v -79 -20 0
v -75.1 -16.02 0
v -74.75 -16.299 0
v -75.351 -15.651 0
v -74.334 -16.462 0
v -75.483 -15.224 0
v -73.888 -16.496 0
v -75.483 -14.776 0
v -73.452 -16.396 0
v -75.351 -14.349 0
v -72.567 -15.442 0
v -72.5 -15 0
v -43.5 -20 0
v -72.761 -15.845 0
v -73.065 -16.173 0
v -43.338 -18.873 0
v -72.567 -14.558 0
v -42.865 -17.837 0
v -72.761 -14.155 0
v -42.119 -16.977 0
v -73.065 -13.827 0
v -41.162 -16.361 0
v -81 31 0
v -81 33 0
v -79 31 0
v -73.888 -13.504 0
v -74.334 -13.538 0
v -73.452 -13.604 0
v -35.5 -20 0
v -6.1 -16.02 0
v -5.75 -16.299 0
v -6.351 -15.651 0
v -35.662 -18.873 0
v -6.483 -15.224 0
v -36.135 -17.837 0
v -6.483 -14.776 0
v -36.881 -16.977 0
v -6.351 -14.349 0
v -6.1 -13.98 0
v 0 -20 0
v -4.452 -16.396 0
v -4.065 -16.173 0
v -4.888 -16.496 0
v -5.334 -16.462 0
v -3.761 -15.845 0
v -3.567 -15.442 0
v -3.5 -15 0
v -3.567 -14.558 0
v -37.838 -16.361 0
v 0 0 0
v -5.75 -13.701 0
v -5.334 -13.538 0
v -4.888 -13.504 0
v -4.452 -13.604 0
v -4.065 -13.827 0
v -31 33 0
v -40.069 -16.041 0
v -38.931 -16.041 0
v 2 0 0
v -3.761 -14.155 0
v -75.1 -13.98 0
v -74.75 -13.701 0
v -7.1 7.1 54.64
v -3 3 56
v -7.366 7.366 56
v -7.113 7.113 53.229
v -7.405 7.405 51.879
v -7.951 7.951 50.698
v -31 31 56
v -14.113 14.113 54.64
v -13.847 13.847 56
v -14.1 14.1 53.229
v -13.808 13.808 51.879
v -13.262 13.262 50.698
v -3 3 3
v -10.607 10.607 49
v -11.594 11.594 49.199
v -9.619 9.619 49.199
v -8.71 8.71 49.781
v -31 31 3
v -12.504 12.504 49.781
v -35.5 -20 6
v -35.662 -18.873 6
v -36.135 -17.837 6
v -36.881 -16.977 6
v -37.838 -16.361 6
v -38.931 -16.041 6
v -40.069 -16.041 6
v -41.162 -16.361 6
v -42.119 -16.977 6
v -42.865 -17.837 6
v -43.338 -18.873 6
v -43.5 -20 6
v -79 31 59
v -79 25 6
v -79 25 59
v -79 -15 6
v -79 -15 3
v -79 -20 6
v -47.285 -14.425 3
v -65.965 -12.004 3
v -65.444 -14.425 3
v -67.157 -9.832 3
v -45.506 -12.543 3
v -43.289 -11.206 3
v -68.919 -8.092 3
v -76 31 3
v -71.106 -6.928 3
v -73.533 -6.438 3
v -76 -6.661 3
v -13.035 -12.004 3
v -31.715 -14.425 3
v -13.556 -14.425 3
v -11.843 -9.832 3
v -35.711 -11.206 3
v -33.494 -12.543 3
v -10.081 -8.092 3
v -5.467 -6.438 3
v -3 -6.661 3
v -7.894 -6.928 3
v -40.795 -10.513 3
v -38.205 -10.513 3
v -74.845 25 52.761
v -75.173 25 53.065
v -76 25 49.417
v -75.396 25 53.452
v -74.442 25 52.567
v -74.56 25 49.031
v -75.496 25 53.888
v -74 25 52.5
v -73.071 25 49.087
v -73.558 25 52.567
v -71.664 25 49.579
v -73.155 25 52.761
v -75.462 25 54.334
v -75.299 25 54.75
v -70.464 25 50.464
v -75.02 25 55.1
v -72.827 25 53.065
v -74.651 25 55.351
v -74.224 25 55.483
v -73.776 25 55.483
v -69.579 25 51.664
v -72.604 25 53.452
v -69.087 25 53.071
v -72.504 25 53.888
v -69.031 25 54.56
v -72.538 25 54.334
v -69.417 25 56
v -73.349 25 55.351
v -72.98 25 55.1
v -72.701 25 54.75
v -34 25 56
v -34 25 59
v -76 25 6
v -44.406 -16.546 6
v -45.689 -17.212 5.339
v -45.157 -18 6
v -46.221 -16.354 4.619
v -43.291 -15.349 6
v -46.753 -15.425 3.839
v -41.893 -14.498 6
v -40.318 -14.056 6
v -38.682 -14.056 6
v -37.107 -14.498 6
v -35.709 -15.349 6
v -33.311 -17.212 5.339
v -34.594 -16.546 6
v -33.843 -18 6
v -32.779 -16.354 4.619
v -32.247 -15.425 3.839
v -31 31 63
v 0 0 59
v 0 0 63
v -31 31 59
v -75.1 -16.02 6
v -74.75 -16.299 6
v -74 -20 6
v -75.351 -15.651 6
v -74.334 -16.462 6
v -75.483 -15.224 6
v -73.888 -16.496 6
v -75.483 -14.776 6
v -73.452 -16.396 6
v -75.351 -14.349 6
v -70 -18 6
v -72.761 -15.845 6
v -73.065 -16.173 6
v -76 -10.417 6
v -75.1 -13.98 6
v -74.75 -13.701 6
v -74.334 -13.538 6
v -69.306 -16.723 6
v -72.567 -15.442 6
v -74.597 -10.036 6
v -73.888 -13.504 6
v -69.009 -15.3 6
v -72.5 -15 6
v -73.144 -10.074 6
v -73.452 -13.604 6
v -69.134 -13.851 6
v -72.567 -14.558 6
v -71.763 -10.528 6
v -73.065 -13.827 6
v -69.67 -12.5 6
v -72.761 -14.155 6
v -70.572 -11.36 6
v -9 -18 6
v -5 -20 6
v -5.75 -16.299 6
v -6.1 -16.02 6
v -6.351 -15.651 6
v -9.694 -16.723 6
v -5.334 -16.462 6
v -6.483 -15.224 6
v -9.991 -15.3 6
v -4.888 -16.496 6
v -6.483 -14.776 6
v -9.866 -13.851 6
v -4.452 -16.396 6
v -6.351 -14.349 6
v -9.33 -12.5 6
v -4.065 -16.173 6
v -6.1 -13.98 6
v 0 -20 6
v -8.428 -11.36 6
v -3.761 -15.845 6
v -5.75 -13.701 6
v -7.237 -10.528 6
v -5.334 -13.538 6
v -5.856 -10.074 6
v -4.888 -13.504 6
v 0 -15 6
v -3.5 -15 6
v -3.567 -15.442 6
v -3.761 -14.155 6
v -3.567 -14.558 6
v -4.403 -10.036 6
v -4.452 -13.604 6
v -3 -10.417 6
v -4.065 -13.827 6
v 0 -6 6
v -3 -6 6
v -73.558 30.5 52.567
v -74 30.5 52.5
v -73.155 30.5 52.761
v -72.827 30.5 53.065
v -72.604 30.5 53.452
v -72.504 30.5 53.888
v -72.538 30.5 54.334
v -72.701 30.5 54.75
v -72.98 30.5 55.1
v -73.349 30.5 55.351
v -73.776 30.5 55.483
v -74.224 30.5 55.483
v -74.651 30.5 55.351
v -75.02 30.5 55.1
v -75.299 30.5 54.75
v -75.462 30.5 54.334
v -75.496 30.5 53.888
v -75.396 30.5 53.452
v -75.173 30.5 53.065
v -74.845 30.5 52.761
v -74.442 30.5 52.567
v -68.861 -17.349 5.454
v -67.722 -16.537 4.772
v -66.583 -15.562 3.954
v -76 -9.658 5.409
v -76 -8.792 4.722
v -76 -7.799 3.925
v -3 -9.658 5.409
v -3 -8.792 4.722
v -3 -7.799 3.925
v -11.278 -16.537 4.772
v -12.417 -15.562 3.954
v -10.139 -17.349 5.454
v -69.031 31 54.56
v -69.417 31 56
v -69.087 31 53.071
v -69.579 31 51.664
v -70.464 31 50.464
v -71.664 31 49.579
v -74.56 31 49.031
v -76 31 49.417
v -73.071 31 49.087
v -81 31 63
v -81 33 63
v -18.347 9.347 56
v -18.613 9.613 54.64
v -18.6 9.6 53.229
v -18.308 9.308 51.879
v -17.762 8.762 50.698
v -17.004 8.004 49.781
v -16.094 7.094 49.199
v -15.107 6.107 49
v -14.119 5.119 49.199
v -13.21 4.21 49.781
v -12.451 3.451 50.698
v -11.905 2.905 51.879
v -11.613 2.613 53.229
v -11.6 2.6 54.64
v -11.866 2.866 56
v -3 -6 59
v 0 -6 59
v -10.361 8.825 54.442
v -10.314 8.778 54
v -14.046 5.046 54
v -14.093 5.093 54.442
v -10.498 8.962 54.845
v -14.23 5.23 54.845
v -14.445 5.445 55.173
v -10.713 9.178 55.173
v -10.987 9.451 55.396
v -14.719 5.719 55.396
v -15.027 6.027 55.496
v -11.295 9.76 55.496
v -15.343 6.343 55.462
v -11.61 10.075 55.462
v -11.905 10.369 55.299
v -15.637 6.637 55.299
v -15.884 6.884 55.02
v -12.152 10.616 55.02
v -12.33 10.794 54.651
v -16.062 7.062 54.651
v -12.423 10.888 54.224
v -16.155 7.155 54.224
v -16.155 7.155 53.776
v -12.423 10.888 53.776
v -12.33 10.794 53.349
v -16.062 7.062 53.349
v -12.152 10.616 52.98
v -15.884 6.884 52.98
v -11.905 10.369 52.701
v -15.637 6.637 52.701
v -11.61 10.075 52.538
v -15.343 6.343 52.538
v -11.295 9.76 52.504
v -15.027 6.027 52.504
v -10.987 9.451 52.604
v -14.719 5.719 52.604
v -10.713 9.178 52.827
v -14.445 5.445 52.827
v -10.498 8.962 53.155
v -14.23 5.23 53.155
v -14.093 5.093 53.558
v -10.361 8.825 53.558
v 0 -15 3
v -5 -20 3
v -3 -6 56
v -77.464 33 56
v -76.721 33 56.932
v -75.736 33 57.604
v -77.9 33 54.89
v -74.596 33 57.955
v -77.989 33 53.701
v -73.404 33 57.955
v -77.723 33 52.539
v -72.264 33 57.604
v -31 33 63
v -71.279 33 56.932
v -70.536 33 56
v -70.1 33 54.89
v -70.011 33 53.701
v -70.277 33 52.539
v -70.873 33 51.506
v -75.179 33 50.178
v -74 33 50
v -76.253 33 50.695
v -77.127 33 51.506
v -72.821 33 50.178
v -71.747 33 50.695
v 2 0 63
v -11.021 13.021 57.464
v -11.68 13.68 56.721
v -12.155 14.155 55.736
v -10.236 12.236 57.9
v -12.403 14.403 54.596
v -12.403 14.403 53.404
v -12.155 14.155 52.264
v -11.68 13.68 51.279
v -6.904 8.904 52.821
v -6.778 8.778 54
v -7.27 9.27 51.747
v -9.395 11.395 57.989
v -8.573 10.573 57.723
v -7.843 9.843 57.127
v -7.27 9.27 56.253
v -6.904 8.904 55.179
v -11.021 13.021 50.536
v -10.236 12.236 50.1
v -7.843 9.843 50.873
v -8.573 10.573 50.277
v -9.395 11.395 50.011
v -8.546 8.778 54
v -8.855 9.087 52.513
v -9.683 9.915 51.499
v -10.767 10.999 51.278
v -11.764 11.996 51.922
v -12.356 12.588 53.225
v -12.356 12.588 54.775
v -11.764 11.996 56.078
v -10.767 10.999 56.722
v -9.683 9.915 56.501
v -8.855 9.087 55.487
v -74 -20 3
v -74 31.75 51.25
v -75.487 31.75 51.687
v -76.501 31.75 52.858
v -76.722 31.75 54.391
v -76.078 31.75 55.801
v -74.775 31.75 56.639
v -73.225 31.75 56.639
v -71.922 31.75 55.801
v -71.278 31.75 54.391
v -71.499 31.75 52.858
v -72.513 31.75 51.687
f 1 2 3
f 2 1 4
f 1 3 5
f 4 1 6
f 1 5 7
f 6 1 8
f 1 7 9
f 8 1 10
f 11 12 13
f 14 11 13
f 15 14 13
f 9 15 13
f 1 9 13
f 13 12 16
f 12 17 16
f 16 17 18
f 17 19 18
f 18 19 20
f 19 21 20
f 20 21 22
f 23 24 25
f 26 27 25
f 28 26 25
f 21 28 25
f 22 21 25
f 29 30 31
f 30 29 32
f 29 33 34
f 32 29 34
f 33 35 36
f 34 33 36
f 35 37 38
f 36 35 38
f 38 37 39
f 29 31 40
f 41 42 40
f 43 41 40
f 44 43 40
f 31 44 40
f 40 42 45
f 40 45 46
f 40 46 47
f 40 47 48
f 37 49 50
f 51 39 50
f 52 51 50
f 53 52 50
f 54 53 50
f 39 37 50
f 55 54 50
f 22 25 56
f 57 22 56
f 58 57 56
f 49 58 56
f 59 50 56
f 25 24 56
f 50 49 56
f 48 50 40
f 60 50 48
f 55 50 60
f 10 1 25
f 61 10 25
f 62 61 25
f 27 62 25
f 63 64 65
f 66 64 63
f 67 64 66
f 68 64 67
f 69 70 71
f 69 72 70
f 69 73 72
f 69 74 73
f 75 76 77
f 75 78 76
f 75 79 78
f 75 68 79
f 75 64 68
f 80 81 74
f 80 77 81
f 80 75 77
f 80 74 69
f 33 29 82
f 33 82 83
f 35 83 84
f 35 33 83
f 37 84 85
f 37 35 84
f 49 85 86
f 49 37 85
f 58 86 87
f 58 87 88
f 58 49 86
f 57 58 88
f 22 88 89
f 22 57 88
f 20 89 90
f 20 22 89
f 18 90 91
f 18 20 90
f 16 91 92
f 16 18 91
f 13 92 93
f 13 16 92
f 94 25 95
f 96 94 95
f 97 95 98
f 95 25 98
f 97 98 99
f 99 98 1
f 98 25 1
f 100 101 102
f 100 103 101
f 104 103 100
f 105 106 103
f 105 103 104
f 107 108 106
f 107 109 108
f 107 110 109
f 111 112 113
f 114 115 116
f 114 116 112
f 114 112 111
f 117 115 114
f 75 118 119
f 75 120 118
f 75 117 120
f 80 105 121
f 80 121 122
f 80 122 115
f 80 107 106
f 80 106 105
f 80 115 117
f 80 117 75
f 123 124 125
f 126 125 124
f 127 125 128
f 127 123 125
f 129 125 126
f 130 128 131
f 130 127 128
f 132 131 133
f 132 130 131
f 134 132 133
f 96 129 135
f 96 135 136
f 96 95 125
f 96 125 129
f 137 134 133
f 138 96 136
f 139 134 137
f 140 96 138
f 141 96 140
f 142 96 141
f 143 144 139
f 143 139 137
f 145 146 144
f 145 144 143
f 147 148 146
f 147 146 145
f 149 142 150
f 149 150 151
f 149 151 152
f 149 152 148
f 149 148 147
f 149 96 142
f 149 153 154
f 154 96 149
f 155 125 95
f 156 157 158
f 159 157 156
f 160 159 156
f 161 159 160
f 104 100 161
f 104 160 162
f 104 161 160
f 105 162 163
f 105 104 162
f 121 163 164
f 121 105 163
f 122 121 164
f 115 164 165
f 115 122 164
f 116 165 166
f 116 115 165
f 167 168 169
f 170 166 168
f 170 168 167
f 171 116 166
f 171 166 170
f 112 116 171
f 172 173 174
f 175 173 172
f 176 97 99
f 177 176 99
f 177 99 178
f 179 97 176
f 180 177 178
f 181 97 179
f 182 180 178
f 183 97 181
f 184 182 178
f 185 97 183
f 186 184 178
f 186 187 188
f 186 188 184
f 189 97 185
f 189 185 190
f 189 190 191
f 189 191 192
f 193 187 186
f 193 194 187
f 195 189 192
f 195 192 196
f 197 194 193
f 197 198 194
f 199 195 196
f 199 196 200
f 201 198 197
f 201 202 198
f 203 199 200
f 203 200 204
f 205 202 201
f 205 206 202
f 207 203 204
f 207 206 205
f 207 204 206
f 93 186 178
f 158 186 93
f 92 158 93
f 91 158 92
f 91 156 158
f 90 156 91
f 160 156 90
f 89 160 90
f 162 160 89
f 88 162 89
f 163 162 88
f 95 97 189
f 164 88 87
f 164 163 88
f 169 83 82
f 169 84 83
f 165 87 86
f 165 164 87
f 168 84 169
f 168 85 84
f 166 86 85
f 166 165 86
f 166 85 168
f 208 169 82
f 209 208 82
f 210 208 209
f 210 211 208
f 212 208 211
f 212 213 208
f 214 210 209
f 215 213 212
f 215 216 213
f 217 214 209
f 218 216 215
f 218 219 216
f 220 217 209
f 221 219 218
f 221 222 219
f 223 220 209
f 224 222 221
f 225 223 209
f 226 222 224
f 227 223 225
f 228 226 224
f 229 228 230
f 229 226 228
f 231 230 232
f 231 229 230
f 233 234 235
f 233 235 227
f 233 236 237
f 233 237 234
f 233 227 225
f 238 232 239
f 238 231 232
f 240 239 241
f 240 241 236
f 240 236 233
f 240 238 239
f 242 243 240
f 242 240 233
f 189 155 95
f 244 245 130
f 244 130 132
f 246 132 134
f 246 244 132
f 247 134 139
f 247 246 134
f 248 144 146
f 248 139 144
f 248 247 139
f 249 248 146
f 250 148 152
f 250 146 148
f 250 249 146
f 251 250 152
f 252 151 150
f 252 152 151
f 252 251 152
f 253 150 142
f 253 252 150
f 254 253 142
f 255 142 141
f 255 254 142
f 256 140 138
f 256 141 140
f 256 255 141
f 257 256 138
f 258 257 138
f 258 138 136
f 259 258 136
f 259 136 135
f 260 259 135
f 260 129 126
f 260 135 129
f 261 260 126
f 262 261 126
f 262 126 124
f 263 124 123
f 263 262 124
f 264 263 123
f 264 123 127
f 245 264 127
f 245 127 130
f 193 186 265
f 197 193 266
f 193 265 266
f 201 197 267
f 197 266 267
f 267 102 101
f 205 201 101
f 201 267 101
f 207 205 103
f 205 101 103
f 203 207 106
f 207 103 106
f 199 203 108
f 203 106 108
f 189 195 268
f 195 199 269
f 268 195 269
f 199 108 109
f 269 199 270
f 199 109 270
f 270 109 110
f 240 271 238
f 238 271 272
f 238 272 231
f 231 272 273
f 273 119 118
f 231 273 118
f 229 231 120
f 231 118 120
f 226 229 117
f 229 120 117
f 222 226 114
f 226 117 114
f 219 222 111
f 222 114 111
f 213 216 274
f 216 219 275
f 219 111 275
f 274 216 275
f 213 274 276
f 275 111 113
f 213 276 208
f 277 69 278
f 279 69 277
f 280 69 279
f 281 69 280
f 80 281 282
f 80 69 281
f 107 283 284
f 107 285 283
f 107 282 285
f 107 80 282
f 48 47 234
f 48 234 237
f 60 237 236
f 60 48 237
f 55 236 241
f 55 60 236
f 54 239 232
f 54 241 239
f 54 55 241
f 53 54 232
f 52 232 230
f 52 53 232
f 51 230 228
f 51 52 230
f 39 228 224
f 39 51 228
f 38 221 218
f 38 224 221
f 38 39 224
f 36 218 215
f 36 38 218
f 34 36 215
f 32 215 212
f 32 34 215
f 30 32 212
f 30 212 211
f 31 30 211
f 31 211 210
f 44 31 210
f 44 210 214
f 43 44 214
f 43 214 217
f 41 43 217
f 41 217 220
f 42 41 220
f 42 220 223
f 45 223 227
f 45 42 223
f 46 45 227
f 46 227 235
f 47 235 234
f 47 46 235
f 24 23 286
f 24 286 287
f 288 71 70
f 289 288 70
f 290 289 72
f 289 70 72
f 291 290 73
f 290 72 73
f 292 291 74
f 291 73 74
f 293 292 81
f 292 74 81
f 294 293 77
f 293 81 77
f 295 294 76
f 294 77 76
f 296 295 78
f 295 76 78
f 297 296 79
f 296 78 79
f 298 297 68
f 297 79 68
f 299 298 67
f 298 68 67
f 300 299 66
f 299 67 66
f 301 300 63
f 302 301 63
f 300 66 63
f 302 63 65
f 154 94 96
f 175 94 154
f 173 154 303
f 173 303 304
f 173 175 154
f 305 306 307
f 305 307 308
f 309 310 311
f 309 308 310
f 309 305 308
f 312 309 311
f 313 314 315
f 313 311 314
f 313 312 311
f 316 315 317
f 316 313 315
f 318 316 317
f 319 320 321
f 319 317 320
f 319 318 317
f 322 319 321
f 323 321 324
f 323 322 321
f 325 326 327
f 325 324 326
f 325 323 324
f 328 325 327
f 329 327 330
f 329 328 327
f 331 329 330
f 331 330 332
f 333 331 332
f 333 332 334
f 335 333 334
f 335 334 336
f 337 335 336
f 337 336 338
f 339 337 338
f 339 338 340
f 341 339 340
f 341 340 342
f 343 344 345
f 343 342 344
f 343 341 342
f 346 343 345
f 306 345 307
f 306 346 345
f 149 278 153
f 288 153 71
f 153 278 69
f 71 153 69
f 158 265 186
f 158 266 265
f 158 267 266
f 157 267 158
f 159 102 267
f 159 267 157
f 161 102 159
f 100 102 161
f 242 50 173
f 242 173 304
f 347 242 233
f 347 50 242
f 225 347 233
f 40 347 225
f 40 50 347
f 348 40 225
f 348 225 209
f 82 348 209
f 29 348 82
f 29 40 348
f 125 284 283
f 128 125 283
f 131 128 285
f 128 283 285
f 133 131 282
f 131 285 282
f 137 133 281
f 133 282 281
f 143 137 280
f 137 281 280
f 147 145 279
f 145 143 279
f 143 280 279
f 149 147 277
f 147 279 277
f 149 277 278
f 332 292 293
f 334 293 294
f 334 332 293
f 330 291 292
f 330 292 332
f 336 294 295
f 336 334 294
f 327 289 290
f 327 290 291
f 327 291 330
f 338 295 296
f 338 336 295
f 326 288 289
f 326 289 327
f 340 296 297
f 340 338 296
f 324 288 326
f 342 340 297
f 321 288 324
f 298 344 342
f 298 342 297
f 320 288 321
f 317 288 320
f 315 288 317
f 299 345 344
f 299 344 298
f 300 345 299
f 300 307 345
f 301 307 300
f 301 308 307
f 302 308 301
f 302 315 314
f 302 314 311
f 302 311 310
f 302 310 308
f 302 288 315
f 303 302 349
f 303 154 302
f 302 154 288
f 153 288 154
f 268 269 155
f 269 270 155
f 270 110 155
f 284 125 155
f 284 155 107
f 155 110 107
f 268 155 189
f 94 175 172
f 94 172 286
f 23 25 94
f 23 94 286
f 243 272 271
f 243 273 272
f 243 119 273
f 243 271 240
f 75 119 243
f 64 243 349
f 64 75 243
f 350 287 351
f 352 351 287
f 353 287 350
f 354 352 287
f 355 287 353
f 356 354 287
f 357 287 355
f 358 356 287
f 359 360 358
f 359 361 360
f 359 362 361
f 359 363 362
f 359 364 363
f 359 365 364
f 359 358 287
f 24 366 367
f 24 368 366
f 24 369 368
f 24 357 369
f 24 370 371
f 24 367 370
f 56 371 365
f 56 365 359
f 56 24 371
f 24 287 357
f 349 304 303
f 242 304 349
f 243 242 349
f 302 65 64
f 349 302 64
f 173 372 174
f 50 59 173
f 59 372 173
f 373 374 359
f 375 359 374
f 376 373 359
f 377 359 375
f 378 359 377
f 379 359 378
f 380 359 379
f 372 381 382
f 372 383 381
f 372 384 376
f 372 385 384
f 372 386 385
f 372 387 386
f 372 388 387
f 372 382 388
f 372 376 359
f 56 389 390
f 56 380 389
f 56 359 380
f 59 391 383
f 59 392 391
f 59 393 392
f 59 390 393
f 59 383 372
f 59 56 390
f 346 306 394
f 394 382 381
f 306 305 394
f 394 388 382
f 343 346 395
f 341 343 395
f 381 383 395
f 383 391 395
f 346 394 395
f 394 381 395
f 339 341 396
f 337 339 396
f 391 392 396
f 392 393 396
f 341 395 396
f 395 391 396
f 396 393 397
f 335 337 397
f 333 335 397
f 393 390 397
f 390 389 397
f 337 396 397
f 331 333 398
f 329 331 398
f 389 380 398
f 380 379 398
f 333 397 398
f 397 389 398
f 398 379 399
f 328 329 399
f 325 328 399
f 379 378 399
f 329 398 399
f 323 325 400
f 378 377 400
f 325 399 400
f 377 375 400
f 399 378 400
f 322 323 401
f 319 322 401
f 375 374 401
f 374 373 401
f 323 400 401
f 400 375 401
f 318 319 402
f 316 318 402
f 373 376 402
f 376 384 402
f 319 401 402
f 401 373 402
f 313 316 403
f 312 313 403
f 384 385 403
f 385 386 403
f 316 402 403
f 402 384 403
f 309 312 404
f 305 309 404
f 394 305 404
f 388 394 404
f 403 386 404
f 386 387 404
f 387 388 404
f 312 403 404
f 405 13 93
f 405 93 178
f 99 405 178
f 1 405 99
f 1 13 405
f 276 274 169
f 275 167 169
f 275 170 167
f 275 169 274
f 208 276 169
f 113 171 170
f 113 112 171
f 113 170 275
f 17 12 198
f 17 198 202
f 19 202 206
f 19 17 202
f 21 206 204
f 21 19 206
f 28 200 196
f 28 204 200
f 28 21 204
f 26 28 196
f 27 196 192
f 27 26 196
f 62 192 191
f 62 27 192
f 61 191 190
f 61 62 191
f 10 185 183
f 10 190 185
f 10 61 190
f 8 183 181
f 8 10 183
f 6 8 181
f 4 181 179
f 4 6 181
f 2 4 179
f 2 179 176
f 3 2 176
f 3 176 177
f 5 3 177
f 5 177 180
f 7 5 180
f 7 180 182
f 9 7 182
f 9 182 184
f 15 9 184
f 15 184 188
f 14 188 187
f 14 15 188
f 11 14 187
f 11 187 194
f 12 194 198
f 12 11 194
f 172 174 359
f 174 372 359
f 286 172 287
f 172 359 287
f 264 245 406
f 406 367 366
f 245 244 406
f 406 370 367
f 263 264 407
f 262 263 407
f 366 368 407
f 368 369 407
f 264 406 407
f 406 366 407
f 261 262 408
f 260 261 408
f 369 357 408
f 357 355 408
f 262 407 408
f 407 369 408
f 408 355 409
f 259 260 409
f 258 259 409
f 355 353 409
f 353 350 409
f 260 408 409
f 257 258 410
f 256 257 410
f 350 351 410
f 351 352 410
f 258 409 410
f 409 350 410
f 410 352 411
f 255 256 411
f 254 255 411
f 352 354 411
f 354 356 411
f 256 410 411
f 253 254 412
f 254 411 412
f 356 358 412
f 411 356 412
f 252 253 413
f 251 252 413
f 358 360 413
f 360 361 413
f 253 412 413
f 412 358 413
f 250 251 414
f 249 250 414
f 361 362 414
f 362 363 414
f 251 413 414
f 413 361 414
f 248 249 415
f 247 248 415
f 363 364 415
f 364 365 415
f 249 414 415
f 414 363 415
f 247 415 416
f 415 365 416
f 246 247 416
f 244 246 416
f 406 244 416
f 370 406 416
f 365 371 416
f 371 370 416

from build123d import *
from OCP.BRepFilletAPI import BRepFilletAPI_MakeChamfer
from build123d.topology import SkipClean

# Parameters (mm, degrees)
EXTRUDE_1_DEPTH          = 63
EXTRUDE_2_DEPTH          = 3
SKETCH_3_W               = 3
SKETCH_3_H               = 6
EXTRUDE_3_DEPTH          = 56
EXTRUDE_4_DEPTH          = 3
SKETCH_6_W               = 3
SKETCH_6_H               = 6
EXTRUDE_5_DEPTH          = 45
SKETCH_7_W               = 3
SKETCH_7_H               = 6
EXTRUDE_6_DEPTH          = 14
SKETCH_8_R               = 4
CUT_EXTRUDE_1_DEPTH      = 3
EXTRUDE_7_DEPTH          = 3
SKETCH_10_R              = 5
EXTRUDE_8_DEPTH          = 3
SKETCH_12_R              = 5
EXTRUDE_9_DEPTH          = 6
CUT_EXTRUDE_3_DEPTH      = 113.049096382
CUT_EXTRUDE_3_DEPTH_BACK = 113.049096382
SKETCH_13_R              = 1.5
CHAMFER_2_SIZE           = 2.5
SKETCH_14_R              = 5
EXTRUDE_10_DEPTH         = 6.363961031
CUT_EXTRUDE_4_DEPTH      = 106.959898075
CUT_EXTRUDE_4_DEPTH_BACK = 106.959898075
SKETCH_15_R              = 1.5
CHAMFER_3_SIZE           = 2.5
CUT_EXTRUDE_5_DEPTH      = 105.398275848
CUT_EXTRUDE_5_DEPTH_BACK = 105.398275848
SKETCH_11_R              = 1.5
CHAMFER_4_SIZE           = 3
CHAMFER_4_SIZE_2         = 3.575260778


with BuildPart() as part:
    # Эскиз1 → Бобышка-Вытянуть1 (new body)
    with BuildSketch(Plane.XY):
        Polygon((0, 0), (-31, 31), (-81, 31), (-81, 33), (-31, 33), (2, 0), align=None)
    extrude(amount=EXTRUDE_1_DEPTH)

    # Эскиз2 → Бобышка-Вытянуть2 (add)
    with BuildSketch(Plane(origin=(0, 0, 0), x_dir=(-1, 0, 0), z_dir=(0, 0, -1))):
        Polygon((0, 0), (31, 31), (79, 31), (79, -20), (0, -20), align=None)
    extrude(amount=-EXTRUDE_2_DEPTH)

    # Эскиз3 → Бобышка-Вытянуть3 (add)
    with BuildSketch(Plane.XY.offset(3)):
        Polygon((0, 0), (0, -6), (-3, -6), (-3, 3), align=None)
        with Locations((-77.5, 28)):
            Rectangle(SKETCH_3_W, SKETCH_3_H)
    extrude(amount=EXTRUDE_3_DEPTH)

    # Эскиз5 → Бобышка-Вытянуть4 (add)
    with BuildSketch(Plane.XY.offset(59)):
        Polygon((-79, 25), (-76, 25), (-34, 25), (-3, -6), (0, -6), (0, 0), (-31, 31), (-79, 31), align=None)
    extrude(amount=-EXTRUDE_4_DEPTH)

    # Эскиз6 → Бобышка-Вытянуть5 (add)
    with BuildSketch(Plane.XZ.offset(-25)):
        with Locations((-77.5, 3)):
            Rectangle(SKETCH_6_W, SKETCH_6_H)
    extrude(amount=EXTRUDE_5_DEPTH)

    # Эскиз7 → Бобышка-Вытянуть6 (add)
    with BuildSketch(Plane.XZ.offset(6)):
        with Locations((-1.5, 3)):
            Rectangle(SKETCH_7_W, SKETCH_7_H)
    extrude(amount=EXTRUDE_6_DEPTH)

    # Эскиз8 → Вырез-Вытянуть1 (cut)
    with BuildSketch(Plane(origin=(0, 0, 0), x_dir=(-1, 0, 0), z_dir=(0, 0, -1))):
        with Locations((39.5, -20)):
            Circle(SKETCH_8_R)
    extrude(amount=-CUT_EXTRUDE_1_DEPTH, mode=Mode.SUBTRACT)

    # Эскиз9 → Бобышка-Вытянуть7 (add)
    with SkipClean():  # the faces are left unmerged after this step: merging them gives an invalid solid
        with BuildSketch(Plane.XY.offset(3)):
            with BuildLine():
                Line((-3, -20), (-35.5, -20))
                ThreePointArc((-35.5, -20), (-39.5, -16), (-43.5, -20))
                Line((-43.5, -20), (-76, -20))
                Line((-76, -20), (-76, -18))
                Line((-76, -18), (-45.156854249, -18))
                ThreePointArc((-45.156854249, -18), (-39.5, -14), (-33.843145751, -18))
                Line((-33.843145751, -18), (-3, -18))
                Line((-3, -18), (-3, -20))
            make_face()
        extrude(amount=EXTRUDE_7_DEPTH)
    add(part.part.scale(1), mode=Mode.REPLACE)  # the faces are merged on a copy

    # Эскиз10 → Бобышка-Вытянуть8 (add)
    with BuildSketch(Plane.XY.offset(3)):
        with Locations((-74, -15)):
            Circle(SKETCH_10_R)
        with Locations((-5, -15)):
            Circle(SKETCH_10_R)
    extrude(amount=EXTRUDE_8_DEPTH)

    # Эскиз12 → Бобышка-Вытянуть9 (add)
    with BuildSketch(Plane.XZ.offset(-31)):
        with Locations((-74, 54)):
            Circle(SKETCH_12_R)
    extrude(amount=EXTRUDE_9_DEPTH)

    # Эскиз13 → Вырез-Вытянуть3 (cut, two sides: drawn at the far end of the back side and taken through both)
    with BuildSketch(Plane.XZ.offset(-25).offset(-CUT_EXTRUDE_3_DEPTH_BACK)):
        with Locations(Location((-74, 54, 0), (0, 0, 270))):
            Circle(SKETCH_13_R)
    extrude(amount=CUT_EXTRUDE_3_DEPTH + CUT_EXTRUDE_3_DEPTH_BACK, mode=Mode.SUBTRACT)

    # Фаска2
    chamfer_2_edges = [part.edges().sort_by_distance(p)[0] for p in [
        (-74, 33, 55.5),
    ]]
    chamfer(chamfer_2_edges, length=CHAMFER_2_SIZE)

    # Эскиз14 → Бобышка-Вытянуть10 (add)
    with BuildSketch(Plane(origin=(0, 0, 0), x_dir=(0, 0, 1), z_dir=(-0.7071067811865462, -0.7071067811865489, 0))):
        with Locations((54, 15)):
            Circle(SKETCH_14_R)
    extrude(amount=EXTRUDE_10_DEPTH)

    # Эскиз15 → Вырез-Вытянуть4 (cut, two sides: drawn at the far end of the back side and taken through both)
    with BuildSketch(Plane(origin=(-4.5, -4.5, 0), x_dir=(0, 0, 1), z_dir=(-0.7071067811865464, -0.7071067811865488, 0)).offset(-CUT_EXTRUDE_4_DEPTH_BACK)):
        with Locations(Location((54, 15, 0), (0, 0, 270))):
            Circle(SKETCH_15_R)
    extrude(amount=CUT_EXTRUDE_4_DEPTH + CUT_EXTRUDE_4_DEPTH_BACK, mode=Mode.SUBTRACT)

    # Фаска3
    chamfer_3_edges = [part.edges().sort_by_distance(p)[0] for p in [
        (-10.66726189, 12.66726189, 54),
    ]]
    chamfer(chamfer_3_edges, length=CHAMFER_3_SIZE)

    # Эскиз11 → Вырез-Вытянуть5 (cut, two sides: drawn at the far end of the back side and taken through both)
    with BuildSketch(Plane.XY.offset(6).offset(-CUT_EXTRUDE_5_DEPTH_BACK)):
        with Locations((-74, -15)):
            Circle(SKETCH_11_R)
        with Locations((-5, -15)):
            Circle(SKETCH_11_R)
    extrude(amount=CUT_EXTRUDE_5_DEPTH + CUT_EXTRUDE_5_DEPTH_BACK, mode=Mode.SUBTRACT)

    # Фаска4
    chamfer_4_edges_1 = [part.edges().sort_by_distance(p)[0] for p in [
        (-8.920951867, -11.897398437, 3),
    ]]
    chamfer_4_side_1 = [part.faces().sort_by_distance(p)[0] for p in [
        (-8.920951867, -11.897398437, 3.06),
    ]]
    chamfer_4_edges_2 = [part.edges().sort_by_distance(p)[0] for p in [
        (-70.079048133, -11.897398437, 3),
    ]]
    chamfer_4_side_2 = [part.faces().sort_by_distance(p)[0] for p in [
        (-70.079048133, -11.897398437, 3.06),
    ]]
    chamfer_4_edges_3 = [part.edges().sort_by_distance(p)[0] for p in [
        (-21.421572875, -18, 3),
    ]]
    chamfer_4_side_3 = [part.faces().sort_by_distance(p)[0] for p in [
        (-21.421572875, -18, 3.06),
    ]]
    chamfer_4_edges_4 = [part.edges().sort_by_distance(p)[0] for p in [
        (-39.5, -14, 3),
    ]]
    chamfer_4_side_4 = [part.faces().sort_by_distance(p)[0] for p in [
        (-39.5, -14, 3.06),
    ]]
    chamfer_4_edges_5 = [part.edges().sort_by_distance(p)[0] for p in [
        (-57.578427125, -18, 3),
    ]]
    chamfer_4_side_5 = [part.faces().sort_by_distance(p)[0] for p in [
        (-57.578427125, -18, 3.06),
    ]]
    chamfer_4 = BRepFilletAPI_MakeChamfer(part.part.solid().wrapped)
    for e in chamfer_4_edges_1:
        chamfer_4.Add(CHAMFER_4_SIZE - 0.0001, CHAMFER_4_SIZE_2 - 0.0001, e.wrapped, chamfer_4_side_1[0].wrapped)
    for e in chamfer_4_edges_2:
        chamfer_4.Add(CHAMFER_4_SIZE - 0.0001, CHAMFER_4_SIZE_2 - 0.0001, e.wrapped, chamfer_4_side_2[0].wrapped)
    for e in chamfer_4_edges_3:
        chamfer_4.Add(CHAMFER_4_SIZE - 0.0001, CHAMFER_4_SIZE_2 - 0.0001, e.wrapped, chamfer_4_side_3[0].wrapped)
    for e in chamfer_4_edges_4:
        chamfer_4.Add(CHAMFER_4_SIZE - 0.0001, CHAMFER_4_SIZE_2 - 0.0001, e.wrapped, chamfer_4_side_4[0].wrapped)
    for e in chamfer_4_edges_5:
        chamfer_4.Add(CHAMFER_4_SIZE - 0.0001, CHAMFER_4_SIZE_2 - 0.0001, e.wrapped, chamfer_4_side_5[0].wrapped)
    add(Compound.cast(chamfer_4.Shape()), mode=Mode.REPLACE)  # a hair under: the kernel refuses the full size


solid = part.part
